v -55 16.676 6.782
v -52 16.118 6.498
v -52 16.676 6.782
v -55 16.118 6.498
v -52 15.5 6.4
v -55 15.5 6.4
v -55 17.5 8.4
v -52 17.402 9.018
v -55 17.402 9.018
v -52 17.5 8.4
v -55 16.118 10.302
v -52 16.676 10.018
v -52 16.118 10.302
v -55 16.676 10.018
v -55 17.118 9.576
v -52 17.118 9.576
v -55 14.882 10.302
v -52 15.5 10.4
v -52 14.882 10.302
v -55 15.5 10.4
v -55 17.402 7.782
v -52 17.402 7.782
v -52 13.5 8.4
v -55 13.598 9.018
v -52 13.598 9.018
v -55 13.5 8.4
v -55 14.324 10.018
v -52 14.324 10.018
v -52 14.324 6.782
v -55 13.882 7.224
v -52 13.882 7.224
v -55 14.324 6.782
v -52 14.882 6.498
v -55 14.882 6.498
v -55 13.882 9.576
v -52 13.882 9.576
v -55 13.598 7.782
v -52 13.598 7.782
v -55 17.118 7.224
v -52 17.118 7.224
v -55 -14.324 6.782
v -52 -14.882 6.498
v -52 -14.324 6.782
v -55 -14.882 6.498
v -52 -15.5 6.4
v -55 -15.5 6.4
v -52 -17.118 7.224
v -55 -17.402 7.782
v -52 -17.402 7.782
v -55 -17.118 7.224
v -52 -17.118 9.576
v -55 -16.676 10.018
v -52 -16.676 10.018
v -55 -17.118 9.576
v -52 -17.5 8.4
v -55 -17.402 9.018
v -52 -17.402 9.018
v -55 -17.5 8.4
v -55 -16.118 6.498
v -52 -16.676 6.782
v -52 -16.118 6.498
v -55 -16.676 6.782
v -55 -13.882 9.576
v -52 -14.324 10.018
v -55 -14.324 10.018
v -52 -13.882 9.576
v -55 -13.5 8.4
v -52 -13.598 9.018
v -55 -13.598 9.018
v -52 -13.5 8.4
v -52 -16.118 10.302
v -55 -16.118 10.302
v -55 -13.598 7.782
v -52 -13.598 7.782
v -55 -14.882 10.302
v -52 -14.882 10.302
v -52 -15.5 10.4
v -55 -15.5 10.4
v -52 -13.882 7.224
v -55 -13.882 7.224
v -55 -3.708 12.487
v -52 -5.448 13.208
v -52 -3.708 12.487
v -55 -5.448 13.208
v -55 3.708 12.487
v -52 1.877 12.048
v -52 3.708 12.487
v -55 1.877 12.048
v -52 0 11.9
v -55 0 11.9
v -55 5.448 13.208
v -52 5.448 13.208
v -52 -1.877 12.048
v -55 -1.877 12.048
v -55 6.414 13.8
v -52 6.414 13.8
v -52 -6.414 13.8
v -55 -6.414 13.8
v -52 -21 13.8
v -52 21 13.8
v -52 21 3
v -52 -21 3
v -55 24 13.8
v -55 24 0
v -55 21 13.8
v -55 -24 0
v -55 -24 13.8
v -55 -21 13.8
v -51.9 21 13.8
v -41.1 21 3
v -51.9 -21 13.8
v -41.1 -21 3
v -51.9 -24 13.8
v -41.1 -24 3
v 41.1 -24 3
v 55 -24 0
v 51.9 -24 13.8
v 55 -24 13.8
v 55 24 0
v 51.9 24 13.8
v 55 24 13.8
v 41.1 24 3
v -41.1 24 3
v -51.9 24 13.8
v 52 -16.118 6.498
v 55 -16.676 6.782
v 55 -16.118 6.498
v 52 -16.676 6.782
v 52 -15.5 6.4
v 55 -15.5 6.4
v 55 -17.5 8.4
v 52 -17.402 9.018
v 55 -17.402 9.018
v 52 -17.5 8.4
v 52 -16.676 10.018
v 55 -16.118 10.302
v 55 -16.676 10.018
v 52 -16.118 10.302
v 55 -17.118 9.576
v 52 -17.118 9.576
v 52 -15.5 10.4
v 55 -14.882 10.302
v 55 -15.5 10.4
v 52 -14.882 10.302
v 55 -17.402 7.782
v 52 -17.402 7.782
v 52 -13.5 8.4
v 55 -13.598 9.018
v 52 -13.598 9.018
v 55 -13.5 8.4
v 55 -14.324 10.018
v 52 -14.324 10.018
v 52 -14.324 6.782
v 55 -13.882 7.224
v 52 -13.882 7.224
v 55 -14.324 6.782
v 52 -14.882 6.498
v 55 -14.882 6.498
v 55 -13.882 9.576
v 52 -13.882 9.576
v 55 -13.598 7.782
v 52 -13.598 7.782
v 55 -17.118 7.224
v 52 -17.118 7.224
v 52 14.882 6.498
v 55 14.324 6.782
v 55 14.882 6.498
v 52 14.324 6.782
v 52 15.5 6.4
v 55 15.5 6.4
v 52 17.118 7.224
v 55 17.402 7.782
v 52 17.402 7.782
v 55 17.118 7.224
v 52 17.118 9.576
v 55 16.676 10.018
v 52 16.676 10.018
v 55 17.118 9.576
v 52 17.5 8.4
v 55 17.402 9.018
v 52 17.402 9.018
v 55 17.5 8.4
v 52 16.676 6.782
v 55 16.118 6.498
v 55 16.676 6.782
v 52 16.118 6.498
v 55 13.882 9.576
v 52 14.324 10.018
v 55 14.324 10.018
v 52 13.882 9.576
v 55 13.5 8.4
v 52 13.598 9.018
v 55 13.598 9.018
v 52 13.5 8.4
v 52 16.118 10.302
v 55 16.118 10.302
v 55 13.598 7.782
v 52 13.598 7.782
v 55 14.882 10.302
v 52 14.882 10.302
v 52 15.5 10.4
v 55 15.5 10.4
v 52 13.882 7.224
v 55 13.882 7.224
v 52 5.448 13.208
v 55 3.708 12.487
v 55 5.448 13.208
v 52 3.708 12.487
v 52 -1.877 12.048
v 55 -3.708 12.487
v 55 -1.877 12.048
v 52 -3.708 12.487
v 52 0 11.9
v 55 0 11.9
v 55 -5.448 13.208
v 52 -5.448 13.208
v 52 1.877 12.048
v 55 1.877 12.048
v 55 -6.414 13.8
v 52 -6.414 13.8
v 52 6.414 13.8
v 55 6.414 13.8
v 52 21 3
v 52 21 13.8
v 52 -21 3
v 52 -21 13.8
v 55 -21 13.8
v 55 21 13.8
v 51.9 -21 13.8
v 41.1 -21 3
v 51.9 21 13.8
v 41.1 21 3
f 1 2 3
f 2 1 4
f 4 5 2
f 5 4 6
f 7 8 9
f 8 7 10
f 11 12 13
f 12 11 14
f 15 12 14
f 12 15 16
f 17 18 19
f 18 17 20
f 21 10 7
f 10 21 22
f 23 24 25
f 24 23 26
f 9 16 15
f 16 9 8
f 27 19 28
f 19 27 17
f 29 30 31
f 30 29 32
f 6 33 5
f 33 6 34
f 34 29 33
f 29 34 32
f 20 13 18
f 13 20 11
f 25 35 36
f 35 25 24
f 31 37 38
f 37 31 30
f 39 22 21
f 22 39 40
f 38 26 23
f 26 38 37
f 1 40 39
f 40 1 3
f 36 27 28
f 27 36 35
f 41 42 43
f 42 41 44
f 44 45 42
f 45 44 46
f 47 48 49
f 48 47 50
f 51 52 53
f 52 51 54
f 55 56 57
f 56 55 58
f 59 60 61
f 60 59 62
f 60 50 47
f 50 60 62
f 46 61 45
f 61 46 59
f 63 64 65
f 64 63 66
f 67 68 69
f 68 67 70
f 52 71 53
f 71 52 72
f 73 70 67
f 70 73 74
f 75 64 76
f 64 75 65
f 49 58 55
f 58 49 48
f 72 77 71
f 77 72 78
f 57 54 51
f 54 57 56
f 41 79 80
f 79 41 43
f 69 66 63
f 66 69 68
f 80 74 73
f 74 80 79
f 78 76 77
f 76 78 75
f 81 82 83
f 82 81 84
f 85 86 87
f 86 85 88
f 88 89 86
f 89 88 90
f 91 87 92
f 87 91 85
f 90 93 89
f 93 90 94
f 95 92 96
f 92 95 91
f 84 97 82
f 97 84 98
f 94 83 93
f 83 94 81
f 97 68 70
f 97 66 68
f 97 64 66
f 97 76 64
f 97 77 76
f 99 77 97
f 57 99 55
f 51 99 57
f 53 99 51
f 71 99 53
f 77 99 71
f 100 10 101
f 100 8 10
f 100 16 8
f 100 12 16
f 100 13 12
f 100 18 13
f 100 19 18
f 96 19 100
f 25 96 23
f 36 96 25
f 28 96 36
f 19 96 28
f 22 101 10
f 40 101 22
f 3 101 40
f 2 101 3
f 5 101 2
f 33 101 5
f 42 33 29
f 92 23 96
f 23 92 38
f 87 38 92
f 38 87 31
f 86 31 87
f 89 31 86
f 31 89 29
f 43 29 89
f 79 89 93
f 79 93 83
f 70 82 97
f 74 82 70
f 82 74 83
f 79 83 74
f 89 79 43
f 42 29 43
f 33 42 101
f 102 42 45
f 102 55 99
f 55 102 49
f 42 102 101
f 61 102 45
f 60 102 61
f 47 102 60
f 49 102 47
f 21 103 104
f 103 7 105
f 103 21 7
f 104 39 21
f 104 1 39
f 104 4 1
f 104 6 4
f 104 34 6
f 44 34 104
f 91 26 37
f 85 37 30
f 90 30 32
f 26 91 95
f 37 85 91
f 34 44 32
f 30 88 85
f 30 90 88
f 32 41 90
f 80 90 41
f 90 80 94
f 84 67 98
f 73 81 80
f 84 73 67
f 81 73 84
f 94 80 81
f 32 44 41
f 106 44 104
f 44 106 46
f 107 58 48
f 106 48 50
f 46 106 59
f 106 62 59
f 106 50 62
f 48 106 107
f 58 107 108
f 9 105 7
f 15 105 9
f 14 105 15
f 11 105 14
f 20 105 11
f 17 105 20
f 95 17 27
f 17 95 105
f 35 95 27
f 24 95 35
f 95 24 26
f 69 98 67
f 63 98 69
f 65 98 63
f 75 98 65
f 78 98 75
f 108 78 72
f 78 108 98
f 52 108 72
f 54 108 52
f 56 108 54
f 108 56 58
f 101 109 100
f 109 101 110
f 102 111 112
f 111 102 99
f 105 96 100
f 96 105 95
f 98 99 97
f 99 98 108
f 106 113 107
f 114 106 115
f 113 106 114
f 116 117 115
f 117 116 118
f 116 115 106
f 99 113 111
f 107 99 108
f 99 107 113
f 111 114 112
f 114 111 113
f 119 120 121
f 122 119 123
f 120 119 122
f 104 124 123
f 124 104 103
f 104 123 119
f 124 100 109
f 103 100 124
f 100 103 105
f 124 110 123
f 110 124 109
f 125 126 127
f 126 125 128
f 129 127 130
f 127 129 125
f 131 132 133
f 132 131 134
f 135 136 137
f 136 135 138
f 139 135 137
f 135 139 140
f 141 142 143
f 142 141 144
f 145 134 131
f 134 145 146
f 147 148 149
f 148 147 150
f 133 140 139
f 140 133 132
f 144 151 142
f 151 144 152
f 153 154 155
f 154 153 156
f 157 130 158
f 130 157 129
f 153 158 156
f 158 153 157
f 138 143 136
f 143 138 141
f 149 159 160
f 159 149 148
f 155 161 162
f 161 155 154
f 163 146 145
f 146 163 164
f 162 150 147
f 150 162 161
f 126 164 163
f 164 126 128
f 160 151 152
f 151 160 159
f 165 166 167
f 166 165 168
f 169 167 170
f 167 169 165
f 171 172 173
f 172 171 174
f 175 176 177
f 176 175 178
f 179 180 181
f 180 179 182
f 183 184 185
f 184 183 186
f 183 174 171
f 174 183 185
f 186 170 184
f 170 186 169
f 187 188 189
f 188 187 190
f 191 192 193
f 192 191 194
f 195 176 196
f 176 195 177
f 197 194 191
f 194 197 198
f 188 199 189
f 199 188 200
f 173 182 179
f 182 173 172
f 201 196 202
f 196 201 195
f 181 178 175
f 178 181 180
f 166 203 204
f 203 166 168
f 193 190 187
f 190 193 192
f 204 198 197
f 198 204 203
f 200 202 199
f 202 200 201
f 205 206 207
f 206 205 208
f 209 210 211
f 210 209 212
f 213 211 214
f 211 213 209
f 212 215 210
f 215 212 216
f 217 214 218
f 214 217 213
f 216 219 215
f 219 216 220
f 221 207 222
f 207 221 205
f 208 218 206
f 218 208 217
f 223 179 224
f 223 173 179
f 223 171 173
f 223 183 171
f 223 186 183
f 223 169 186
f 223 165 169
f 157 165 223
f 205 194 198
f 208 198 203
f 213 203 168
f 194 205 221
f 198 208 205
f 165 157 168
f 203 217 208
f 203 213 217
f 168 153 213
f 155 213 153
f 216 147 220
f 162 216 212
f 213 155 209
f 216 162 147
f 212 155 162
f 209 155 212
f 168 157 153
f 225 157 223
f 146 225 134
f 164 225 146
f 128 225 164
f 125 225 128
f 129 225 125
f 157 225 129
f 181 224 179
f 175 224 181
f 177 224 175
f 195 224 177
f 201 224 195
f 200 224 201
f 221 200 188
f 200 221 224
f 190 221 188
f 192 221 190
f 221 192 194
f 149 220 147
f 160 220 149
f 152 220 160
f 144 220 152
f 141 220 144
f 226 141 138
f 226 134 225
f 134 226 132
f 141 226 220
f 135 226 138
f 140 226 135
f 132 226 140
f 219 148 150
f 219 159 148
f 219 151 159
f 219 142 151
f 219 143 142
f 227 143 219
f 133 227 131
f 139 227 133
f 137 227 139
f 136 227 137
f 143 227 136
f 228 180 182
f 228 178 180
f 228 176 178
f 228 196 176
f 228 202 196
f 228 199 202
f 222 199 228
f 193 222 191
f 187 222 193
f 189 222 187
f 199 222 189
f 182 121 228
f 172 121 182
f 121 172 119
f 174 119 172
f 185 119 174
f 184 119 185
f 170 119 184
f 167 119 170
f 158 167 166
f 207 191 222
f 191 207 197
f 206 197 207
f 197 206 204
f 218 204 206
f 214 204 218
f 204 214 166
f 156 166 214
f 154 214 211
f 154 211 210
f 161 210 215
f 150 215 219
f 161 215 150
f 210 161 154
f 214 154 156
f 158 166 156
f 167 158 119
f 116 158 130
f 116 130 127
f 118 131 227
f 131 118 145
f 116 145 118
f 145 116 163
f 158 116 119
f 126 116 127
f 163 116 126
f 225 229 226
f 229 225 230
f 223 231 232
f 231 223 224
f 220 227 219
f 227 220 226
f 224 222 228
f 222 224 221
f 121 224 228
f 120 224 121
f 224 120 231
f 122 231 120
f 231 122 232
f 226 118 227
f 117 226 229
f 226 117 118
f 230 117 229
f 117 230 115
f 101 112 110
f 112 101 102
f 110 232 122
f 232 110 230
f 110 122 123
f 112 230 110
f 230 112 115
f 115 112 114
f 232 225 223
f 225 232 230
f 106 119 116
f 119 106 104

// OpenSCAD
// file: lib/stepper.scad
smWidth = 42;
smLength = 40;
smScrewHoleOffsets = 31/2;
smCenterDiameter = 22;
smExtra = 1;

module stepperMotor() {
    smCenterHeight = 2;
    smShaftDiameter = 5;
    smShaftLength = 23;
    smScrewDepth = 4.5;
    smScrewDiameter = 3;
    smEdgeTrimOffset = 27;
    module add() {
        translate([-smWidth/2, -smLength, -smWidth/2]) {
            cube([smWidth, smLength, smWidth]);
        }
        rotate([-90, 0, 0]) {
            cylinder(d=smCenterDiameter, h=smCenterHeight, $fn=30);
            cylinder(d=smShaftDiameter, h=smShaftLength, $fn=20);
        }
    }
    module del() {
        for (x = [smScrewHoleOffsets, -smScrewHoleOffsets]) {
            for (z = [smScrewHoleOffsets, -smScrewHoleOffsets]) {
                translate([x, iota, z]) {
                    rotate([90, 0, 0]) {
                        cylinder(d=smScrewDiameter, h=smScrewDepth, $fn=40);
                    }
                }
            }
        }
        for (a = [45, 135, 225, 315]) {
            rotate([0, a, 0]) {
                translate([smEdgeTrimOffset,
                        -smLength-iota, -smWidth/2-iota]) {
                    cube([smWidth, smLength+2*iota, smWidth+2*iota]);
                }
            }
        }

    }
    difference() {
        add();
        del();
    }
}

module stepperMotorHole() {
    smHoleHeight = 20;
    smScrewHoleDiameter = 4;

    widthPlusExtra = smWidth + smExtra;
    lengthPlusExtra = smLength + smExtra/2;

    translate([-smWidth/2, -lengthPlusExtra, -widthPlusExtra/2]) {
        cube([smWidth, lengthPlusExtra, widthPlusExtra]);
    }
    translate([0, -iota, 0]) {
        rotate([-90, 0, 0]) {
            cylinder(d=smCenterDiameter+smExtra, h=smHoleHeight, $fn=40);
        }
    }
    for (x = [smScrewHoleOffsets, -smScrewHoleOffsets]) {
        for (z = [smScrewHoleOffsets, -smScrewHoleOffsets]) {
            translate([x, smHoleHeight-iota, z]) {
                rotate([90, 0, 0]) {
                    cylinder(d=smScrewHoleDiameter, h=smHoleHeight, $fn=40);
                }
            }
        }
    }

}
// file: lib/commonConstants.scad
// A small quantity to keep parts from starting or ending at exactly the
// same location. For example when we create a hole through an object we
// want the object being subtracted to stick slightly past the object being
// subtracted from.
iota = 0.1;


// Length and hole diameter of the #4 x 3/8in Phillips mount screw.
screwLength = 9.3;
screwHoleDiameter = 2.75;
screwHeadDiameter = 6.5;
screwBodyDiameter = 3.4;


// These constants are the basic parameters of the mount plate. They are
// necessary for other components to make their calculations.
mountPlateWidth = 37.6;
mountPlateLength = 51;


// These constants are the basis for the carbon fiber mount points. They are
// necessary for other components to make their calculations.
mountRodDiameter = 5.5;         // A little extra because holes are smaller.
mountThickness = 9;
mountDiameter = mountRodDiameter + 2*mountThickness;


// These constasnts are teh basis for the motor base. They are necessary for
// other components to make their calculations.
motorBaseExtraAxisOffset = 5;
motorBaseTopOffset = sqrt(3)*mountPlateWidth/6 + motorBaseExtraAxisOffset;
motorBaseBottomOffset = mountPlateLength/sqrt(2) + motorBaseTopOffset;
motorBaseBottomRadius = sqrt(pow(motorBaseBottomOffset,2) +
                             pow(mountPlateWidth/2, 2));
mountBaseRodOffsets = motorBaseBottomRadius-mountDiameter/2;
// main file
include <lib/commonConstants.scad>;
include <lib/stepper.scad>;
include <lib/commonMounts.scad>;

twoWheelBaseBottom();
